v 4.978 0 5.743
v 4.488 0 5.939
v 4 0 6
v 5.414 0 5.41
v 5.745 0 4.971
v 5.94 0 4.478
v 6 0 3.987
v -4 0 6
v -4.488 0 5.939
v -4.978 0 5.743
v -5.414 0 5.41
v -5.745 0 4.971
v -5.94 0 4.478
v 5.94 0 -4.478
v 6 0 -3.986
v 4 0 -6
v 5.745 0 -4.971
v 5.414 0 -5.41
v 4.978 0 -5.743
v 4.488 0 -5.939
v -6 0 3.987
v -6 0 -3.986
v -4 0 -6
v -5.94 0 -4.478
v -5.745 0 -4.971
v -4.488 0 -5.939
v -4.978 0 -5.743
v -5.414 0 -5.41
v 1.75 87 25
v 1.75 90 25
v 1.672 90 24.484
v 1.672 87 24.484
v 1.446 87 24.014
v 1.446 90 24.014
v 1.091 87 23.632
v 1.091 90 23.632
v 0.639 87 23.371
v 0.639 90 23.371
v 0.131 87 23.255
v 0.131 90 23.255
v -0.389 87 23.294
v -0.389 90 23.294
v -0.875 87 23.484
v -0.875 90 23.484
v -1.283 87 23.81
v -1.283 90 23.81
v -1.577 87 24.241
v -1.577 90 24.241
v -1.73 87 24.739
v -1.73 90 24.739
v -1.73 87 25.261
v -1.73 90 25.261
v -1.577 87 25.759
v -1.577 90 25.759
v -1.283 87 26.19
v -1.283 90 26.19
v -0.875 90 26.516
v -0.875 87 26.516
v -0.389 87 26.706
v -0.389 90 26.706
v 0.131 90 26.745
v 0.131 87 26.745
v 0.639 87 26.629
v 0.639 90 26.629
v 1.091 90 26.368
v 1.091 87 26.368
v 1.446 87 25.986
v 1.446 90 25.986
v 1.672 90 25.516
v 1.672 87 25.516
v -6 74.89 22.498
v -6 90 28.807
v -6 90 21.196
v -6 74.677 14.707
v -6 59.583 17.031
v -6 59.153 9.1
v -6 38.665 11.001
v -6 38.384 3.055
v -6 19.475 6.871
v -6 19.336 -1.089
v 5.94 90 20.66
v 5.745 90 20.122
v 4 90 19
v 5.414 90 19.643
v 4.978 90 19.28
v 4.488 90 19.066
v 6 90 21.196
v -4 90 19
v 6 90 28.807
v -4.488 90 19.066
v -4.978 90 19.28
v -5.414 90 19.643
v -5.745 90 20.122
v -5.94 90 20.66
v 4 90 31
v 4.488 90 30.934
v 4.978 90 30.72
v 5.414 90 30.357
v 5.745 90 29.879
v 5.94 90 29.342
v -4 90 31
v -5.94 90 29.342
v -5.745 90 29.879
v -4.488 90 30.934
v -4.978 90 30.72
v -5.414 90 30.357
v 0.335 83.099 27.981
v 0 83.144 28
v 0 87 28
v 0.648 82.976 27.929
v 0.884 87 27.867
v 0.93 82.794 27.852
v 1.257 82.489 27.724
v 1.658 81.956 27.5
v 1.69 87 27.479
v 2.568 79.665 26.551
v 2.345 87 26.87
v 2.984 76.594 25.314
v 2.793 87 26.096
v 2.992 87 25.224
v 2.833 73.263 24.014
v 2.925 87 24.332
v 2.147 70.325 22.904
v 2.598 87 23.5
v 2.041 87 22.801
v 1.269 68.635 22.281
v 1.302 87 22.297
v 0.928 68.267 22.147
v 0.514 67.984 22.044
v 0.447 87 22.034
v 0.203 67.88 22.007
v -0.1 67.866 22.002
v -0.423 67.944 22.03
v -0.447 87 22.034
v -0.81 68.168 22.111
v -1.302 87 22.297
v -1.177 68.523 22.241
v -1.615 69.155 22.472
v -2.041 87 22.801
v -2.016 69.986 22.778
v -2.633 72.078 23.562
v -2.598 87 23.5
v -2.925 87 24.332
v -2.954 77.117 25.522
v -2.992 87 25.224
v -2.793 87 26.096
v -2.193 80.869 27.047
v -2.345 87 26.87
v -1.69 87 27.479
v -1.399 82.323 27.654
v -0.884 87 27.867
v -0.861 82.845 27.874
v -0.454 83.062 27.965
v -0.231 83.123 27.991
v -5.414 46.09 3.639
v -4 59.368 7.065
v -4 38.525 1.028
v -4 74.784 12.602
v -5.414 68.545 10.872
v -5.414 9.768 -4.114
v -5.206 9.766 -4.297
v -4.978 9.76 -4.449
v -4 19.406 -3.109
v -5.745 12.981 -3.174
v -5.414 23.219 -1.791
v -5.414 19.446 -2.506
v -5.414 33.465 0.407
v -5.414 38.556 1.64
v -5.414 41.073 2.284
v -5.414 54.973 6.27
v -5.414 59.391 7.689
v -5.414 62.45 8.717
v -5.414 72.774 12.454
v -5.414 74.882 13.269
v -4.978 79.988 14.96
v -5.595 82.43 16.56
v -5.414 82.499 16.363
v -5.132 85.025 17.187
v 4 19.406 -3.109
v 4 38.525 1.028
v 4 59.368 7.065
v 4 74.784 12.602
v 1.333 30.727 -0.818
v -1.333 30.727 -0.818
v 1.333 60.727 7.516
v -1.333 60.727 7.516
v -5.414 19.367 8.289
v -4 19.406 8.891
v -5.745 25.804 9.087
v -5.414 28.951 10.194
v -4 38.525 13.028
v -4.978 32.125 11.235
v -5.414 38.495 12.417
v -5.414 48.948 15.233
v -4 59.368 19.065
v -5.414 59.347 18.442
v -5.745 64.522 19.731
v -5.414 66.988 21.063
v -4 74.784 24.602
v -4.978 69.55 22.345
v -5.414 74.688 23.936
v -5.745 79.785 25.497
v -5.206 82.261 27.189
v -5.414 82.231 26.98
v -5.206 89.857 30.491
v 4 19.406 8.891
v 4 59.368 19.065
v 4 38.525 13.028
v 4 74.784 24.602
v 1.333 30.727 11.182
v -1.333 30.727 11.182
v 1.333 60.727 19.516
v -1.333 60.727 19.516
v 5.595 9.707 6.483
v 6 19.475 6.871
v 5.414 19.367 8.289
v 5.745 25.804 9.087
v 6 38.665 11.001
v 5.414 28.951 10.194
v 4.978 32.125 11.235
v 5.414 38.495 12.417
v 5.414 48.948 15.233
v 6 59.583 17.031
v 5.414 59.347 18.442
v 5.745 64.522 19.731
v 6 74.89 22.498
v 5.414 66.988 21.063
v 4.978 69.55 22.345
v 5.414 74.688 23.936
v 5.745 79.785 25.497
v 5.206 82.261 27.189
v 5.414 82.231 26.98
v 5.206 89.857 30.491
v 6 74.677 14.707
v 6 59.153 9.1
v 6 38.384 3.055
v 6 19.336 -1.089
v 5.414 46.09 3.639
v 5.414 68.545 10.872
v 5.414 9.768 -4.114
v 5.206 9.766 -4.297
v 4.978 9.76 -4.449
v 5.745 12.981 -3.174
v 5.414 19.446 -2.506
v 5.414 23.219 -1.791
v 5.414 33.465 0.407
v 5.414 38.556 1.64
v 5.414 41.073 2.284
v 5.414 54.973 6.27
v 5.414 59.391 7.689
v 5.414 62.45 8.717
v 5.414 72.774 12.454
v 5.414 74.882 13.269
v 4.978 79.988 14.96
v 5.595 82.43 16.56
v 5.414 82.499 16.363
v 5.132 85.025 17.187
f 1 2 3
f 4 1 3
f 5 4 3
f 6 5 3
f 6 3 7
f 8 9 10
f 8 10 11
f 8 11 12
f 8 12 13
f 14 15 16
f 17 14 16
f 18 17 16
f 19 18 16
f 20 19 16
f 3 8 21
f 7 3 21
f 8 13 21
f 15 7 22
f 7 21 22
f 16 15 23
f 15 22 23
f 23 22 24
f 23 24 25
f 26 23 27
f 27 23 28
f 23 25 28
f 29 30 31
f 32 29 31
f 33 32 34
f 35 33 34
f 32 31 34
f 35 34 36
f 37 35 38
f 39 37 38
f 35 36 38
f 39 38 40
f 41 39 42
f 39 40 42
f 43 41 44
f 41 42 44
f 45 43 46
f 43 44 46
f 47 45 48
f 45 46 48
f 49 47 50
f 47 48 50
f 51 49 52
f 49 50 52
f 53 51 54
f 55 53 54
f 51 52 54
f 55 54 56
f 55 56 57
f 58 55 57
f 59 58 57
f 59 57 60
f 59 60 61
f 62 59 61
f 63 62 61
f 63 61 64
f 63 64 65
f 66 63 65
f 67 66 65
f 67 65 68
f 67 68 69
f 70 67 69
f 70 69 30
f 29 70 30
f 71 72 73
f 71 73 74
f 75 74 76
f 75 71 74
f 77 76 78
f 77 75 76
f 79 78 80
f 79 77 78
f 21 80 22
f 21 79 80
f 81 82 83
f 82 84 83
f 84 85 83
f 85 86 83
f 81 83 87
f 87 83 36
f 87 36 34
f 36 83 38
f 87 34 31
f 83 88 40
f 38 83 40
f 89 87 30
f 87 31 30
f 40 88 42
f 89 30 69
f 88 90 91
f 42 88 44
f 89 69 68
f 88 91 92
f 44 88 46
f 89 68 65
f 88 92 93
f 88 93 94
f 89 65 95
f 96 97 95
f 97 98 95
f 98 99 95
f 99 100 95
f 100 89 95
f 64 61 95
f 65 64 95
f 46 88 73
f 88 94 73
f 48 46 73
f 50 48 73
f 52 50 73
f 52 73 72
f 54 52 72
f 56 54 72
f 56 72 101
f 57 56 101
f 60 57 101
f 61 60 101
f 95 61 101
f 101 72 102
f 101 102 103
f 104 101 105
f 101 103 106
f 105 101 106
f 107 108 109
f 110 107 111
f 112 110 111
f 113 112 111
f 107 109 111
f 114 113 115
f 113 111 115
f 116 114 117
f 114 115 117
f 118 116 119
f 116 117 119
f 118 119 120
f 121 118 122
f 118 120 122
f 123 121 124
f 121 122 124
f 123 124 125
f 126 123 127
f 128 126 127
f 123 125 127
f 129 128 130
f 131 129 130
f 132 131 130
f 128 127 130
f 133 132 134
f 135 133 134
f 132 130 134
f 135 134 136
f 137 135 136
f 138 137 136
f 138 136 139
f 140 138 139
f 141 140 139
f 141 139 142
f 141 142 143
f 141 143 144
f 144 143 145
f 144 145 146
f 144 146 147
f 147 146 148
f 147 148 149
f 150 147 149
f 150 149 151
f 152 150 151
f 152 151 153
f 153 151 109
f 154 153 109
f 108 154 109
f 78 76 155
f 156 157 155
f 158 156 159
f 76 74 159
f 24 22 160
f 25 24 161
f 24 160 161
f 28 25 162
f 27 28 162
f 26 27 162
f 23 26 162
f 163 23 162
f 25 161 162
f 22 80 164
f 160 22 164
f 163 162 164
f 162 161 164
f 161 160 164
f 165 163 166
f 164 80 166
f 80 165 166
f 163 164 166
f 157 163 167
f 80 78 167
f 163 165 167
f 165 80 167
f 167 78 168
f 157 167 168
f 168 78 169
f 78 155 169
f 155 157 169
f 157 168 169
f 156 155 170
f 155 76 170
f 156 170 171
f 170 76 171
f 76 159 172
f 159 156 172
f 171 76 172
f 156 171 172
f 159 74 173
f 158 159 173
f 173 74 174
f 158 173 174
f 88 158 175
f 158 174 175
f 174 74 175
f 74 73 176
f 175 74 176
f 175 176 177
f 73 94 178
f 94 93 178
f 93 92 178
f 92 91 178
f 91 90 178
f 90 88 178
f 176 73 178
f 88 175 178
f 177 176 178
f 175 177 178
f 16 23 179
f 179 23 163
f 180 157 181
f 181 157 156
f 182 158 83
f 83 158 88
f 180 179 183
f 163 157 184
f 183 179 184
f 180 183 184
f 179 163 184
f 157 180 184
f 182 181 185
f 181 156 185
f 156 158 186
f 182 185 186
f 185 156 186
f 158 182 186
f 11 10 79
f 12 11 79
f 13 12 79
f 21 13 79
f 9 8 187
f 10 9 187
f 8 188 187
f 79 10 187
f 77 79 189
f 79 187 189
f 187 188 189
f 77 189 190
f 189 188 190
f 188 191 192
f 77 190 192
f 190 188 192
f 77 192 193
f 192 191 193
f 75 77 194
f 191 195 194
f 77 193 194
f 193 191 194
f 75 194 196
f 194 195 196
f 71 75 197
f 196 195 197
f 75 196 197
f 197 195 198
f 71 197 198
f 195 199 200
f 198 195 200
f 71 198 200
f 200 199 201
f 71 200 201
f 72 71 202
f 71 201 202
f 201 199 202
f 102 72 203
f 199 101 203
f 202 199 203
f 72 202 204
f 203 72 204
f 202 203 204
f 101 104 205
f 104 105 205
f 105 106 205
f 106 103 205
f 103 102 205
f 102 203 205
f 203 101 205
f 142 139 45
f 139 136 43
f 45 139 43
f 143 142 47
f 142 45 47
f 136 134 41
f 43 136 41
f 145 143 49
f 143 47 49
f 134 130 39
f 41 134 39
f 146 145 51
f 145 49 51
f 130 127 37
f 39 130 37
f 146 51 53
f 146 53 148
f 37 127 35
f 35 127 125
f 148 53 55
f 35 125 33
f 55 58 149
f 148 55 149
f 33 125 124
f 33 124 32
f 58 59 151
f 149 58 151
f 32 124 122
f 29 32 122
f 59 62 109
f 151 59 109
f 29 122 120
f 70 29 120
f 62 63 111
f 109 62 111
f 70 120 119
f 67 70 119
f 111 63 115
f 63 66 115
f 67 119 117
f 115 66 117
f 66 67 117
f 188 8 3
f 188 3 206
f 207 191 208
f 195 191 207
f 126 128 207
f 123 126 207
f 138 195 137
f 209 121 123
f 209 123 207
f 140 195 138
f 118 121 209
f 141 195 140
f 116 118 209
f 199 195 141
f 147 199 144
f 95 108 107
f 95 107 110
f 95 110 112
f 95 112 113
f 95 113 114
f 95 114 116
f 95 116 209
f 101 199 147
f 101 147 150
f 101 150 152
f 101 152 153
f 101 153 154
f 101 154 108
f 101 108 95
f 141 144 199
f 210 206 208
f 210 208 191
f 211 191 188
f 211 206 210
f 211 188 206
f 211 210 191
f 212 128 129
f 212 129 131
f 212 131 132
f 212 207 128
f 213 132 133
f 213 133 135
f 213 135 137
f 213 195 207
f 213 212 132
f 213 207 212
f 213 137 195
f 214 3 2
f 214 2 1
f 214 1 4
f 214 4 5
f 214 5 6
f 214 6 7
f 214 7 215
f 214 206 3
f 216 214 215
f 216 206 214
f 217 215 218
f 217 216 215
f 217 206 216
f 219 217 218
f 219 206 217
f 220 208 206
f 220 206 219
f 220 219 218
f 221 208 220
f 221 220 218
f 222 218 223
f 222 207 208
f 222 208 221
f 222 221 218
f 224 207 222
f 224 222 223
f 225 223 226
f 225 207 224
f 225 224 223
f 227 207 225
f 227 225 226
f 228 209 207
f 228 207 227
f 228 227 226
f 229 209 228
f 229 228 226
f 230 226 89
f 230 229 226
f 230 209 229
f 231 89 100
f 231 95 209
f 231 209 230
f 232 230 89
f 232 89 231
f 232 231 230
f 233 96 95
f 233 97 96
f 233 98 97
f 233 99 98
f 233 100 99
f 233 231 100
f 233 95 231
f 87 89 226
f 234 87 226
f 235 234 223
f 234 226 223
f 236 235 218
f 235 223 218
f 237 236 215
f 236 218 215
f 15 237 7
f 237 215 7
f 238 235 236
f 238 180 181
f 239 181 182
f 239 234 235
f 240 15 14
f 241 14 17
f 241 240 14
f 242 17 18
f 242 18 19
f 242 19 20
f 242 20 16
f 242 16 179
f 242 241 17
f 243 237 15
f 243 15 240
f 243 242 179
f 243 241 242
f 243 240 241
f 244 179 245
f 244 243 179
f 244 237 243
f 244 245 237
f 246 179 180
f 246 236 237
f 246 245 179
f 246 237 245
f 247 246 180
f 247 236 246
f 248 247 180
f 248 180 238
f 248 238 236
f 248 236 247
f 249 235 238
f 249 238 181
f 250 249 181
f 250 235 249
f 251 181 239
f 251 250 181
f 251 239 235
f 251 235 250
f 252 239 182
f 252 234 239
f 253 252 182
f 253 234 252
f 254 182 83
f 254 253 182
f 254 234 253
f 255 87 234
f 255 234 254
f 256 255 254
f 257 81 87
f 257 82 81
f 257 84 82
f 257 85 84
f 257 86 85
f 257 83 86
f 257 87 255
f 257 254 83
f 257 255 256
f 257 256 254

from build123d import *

# Parameters (mm, degrees)
SWEEP1_START               = -6
SWEEP1_DEPTH               = 12
SKETCH3_R                  = 3
CUT_EXTRUDE1_DEPTH         = 93.552687831
F_3_5_3_5_DIAMETER_HOLE1_D = 3.5
FILLET2_R                  = 2


# Read off the part's stored shape, not the designer's step: Sweep1
with BuildPart() as part:
    # Sweep1 outline → Sweep1 (new body)
    with BuildSketch(Plane.YZ.offset(SWEEP1_START)):
        with BuildLine():
            add(Edge.make_bspline(
                [(0, 6), (31.090204345, 9.606991211), (61.090204345, 17.940324544), (90, 31)],
                knots=[0, 0, 0, 0, 1, 1, 1, 1], degree=3))
            Line((0, 6), (0, -6))
            add(Edge.make_bspline(
                [(0, -6), (31.090204345, -2.393008789), (61.090204345, 5.940324544), (90, 19)],
                knots=[0, 0, 0, 0, 1, 1, 1, 1], degree=3))
            Line((90, 19), (90, 31))
        make_face()
    extrude(amount=SWEEP1_DEPTH)

    # Sketch3 → Cut-Extrude1 (cut, through all)
    with BuildSketch(Plane(origin=(0, 87, 0), x_dir=(1, 0, 0), z_dir=(0, 1, 0))):
        with Locations(Location((0, -25, 0), (0, 0, 270))):
            Circle(SKETCH3_R)
    extrude(amount=-CUT_EXTRUDE1_DEPTH, mode=Mode.SUBTRACT)

    # Ø3.5 (3.5) Diameter Hole1 (through all)
    with Locations(Plane(origin=(0, 87, 0), x_dir=(-1, 0, 0), z_dir=(0, -1, 0))):
        with Locations((0, -25)):
            Hole(F_3_5_3_5_DIAMETER_HOLE1_D / 2)

    # Fillet2
    fillet2_edges = [part.edges().sort_by_distance(p)[0] for p in [
        (6, 45.971752724, 14.998093053),
        (6, 45.971752724, 2.998093053),
        (-6, 45.971752724, 2.998093053),
        (-6, 45.971752724, 14.998093053),
    ]]
    fillet(fillet2_edges, radius=FILLET2_R)


solid = part.part
